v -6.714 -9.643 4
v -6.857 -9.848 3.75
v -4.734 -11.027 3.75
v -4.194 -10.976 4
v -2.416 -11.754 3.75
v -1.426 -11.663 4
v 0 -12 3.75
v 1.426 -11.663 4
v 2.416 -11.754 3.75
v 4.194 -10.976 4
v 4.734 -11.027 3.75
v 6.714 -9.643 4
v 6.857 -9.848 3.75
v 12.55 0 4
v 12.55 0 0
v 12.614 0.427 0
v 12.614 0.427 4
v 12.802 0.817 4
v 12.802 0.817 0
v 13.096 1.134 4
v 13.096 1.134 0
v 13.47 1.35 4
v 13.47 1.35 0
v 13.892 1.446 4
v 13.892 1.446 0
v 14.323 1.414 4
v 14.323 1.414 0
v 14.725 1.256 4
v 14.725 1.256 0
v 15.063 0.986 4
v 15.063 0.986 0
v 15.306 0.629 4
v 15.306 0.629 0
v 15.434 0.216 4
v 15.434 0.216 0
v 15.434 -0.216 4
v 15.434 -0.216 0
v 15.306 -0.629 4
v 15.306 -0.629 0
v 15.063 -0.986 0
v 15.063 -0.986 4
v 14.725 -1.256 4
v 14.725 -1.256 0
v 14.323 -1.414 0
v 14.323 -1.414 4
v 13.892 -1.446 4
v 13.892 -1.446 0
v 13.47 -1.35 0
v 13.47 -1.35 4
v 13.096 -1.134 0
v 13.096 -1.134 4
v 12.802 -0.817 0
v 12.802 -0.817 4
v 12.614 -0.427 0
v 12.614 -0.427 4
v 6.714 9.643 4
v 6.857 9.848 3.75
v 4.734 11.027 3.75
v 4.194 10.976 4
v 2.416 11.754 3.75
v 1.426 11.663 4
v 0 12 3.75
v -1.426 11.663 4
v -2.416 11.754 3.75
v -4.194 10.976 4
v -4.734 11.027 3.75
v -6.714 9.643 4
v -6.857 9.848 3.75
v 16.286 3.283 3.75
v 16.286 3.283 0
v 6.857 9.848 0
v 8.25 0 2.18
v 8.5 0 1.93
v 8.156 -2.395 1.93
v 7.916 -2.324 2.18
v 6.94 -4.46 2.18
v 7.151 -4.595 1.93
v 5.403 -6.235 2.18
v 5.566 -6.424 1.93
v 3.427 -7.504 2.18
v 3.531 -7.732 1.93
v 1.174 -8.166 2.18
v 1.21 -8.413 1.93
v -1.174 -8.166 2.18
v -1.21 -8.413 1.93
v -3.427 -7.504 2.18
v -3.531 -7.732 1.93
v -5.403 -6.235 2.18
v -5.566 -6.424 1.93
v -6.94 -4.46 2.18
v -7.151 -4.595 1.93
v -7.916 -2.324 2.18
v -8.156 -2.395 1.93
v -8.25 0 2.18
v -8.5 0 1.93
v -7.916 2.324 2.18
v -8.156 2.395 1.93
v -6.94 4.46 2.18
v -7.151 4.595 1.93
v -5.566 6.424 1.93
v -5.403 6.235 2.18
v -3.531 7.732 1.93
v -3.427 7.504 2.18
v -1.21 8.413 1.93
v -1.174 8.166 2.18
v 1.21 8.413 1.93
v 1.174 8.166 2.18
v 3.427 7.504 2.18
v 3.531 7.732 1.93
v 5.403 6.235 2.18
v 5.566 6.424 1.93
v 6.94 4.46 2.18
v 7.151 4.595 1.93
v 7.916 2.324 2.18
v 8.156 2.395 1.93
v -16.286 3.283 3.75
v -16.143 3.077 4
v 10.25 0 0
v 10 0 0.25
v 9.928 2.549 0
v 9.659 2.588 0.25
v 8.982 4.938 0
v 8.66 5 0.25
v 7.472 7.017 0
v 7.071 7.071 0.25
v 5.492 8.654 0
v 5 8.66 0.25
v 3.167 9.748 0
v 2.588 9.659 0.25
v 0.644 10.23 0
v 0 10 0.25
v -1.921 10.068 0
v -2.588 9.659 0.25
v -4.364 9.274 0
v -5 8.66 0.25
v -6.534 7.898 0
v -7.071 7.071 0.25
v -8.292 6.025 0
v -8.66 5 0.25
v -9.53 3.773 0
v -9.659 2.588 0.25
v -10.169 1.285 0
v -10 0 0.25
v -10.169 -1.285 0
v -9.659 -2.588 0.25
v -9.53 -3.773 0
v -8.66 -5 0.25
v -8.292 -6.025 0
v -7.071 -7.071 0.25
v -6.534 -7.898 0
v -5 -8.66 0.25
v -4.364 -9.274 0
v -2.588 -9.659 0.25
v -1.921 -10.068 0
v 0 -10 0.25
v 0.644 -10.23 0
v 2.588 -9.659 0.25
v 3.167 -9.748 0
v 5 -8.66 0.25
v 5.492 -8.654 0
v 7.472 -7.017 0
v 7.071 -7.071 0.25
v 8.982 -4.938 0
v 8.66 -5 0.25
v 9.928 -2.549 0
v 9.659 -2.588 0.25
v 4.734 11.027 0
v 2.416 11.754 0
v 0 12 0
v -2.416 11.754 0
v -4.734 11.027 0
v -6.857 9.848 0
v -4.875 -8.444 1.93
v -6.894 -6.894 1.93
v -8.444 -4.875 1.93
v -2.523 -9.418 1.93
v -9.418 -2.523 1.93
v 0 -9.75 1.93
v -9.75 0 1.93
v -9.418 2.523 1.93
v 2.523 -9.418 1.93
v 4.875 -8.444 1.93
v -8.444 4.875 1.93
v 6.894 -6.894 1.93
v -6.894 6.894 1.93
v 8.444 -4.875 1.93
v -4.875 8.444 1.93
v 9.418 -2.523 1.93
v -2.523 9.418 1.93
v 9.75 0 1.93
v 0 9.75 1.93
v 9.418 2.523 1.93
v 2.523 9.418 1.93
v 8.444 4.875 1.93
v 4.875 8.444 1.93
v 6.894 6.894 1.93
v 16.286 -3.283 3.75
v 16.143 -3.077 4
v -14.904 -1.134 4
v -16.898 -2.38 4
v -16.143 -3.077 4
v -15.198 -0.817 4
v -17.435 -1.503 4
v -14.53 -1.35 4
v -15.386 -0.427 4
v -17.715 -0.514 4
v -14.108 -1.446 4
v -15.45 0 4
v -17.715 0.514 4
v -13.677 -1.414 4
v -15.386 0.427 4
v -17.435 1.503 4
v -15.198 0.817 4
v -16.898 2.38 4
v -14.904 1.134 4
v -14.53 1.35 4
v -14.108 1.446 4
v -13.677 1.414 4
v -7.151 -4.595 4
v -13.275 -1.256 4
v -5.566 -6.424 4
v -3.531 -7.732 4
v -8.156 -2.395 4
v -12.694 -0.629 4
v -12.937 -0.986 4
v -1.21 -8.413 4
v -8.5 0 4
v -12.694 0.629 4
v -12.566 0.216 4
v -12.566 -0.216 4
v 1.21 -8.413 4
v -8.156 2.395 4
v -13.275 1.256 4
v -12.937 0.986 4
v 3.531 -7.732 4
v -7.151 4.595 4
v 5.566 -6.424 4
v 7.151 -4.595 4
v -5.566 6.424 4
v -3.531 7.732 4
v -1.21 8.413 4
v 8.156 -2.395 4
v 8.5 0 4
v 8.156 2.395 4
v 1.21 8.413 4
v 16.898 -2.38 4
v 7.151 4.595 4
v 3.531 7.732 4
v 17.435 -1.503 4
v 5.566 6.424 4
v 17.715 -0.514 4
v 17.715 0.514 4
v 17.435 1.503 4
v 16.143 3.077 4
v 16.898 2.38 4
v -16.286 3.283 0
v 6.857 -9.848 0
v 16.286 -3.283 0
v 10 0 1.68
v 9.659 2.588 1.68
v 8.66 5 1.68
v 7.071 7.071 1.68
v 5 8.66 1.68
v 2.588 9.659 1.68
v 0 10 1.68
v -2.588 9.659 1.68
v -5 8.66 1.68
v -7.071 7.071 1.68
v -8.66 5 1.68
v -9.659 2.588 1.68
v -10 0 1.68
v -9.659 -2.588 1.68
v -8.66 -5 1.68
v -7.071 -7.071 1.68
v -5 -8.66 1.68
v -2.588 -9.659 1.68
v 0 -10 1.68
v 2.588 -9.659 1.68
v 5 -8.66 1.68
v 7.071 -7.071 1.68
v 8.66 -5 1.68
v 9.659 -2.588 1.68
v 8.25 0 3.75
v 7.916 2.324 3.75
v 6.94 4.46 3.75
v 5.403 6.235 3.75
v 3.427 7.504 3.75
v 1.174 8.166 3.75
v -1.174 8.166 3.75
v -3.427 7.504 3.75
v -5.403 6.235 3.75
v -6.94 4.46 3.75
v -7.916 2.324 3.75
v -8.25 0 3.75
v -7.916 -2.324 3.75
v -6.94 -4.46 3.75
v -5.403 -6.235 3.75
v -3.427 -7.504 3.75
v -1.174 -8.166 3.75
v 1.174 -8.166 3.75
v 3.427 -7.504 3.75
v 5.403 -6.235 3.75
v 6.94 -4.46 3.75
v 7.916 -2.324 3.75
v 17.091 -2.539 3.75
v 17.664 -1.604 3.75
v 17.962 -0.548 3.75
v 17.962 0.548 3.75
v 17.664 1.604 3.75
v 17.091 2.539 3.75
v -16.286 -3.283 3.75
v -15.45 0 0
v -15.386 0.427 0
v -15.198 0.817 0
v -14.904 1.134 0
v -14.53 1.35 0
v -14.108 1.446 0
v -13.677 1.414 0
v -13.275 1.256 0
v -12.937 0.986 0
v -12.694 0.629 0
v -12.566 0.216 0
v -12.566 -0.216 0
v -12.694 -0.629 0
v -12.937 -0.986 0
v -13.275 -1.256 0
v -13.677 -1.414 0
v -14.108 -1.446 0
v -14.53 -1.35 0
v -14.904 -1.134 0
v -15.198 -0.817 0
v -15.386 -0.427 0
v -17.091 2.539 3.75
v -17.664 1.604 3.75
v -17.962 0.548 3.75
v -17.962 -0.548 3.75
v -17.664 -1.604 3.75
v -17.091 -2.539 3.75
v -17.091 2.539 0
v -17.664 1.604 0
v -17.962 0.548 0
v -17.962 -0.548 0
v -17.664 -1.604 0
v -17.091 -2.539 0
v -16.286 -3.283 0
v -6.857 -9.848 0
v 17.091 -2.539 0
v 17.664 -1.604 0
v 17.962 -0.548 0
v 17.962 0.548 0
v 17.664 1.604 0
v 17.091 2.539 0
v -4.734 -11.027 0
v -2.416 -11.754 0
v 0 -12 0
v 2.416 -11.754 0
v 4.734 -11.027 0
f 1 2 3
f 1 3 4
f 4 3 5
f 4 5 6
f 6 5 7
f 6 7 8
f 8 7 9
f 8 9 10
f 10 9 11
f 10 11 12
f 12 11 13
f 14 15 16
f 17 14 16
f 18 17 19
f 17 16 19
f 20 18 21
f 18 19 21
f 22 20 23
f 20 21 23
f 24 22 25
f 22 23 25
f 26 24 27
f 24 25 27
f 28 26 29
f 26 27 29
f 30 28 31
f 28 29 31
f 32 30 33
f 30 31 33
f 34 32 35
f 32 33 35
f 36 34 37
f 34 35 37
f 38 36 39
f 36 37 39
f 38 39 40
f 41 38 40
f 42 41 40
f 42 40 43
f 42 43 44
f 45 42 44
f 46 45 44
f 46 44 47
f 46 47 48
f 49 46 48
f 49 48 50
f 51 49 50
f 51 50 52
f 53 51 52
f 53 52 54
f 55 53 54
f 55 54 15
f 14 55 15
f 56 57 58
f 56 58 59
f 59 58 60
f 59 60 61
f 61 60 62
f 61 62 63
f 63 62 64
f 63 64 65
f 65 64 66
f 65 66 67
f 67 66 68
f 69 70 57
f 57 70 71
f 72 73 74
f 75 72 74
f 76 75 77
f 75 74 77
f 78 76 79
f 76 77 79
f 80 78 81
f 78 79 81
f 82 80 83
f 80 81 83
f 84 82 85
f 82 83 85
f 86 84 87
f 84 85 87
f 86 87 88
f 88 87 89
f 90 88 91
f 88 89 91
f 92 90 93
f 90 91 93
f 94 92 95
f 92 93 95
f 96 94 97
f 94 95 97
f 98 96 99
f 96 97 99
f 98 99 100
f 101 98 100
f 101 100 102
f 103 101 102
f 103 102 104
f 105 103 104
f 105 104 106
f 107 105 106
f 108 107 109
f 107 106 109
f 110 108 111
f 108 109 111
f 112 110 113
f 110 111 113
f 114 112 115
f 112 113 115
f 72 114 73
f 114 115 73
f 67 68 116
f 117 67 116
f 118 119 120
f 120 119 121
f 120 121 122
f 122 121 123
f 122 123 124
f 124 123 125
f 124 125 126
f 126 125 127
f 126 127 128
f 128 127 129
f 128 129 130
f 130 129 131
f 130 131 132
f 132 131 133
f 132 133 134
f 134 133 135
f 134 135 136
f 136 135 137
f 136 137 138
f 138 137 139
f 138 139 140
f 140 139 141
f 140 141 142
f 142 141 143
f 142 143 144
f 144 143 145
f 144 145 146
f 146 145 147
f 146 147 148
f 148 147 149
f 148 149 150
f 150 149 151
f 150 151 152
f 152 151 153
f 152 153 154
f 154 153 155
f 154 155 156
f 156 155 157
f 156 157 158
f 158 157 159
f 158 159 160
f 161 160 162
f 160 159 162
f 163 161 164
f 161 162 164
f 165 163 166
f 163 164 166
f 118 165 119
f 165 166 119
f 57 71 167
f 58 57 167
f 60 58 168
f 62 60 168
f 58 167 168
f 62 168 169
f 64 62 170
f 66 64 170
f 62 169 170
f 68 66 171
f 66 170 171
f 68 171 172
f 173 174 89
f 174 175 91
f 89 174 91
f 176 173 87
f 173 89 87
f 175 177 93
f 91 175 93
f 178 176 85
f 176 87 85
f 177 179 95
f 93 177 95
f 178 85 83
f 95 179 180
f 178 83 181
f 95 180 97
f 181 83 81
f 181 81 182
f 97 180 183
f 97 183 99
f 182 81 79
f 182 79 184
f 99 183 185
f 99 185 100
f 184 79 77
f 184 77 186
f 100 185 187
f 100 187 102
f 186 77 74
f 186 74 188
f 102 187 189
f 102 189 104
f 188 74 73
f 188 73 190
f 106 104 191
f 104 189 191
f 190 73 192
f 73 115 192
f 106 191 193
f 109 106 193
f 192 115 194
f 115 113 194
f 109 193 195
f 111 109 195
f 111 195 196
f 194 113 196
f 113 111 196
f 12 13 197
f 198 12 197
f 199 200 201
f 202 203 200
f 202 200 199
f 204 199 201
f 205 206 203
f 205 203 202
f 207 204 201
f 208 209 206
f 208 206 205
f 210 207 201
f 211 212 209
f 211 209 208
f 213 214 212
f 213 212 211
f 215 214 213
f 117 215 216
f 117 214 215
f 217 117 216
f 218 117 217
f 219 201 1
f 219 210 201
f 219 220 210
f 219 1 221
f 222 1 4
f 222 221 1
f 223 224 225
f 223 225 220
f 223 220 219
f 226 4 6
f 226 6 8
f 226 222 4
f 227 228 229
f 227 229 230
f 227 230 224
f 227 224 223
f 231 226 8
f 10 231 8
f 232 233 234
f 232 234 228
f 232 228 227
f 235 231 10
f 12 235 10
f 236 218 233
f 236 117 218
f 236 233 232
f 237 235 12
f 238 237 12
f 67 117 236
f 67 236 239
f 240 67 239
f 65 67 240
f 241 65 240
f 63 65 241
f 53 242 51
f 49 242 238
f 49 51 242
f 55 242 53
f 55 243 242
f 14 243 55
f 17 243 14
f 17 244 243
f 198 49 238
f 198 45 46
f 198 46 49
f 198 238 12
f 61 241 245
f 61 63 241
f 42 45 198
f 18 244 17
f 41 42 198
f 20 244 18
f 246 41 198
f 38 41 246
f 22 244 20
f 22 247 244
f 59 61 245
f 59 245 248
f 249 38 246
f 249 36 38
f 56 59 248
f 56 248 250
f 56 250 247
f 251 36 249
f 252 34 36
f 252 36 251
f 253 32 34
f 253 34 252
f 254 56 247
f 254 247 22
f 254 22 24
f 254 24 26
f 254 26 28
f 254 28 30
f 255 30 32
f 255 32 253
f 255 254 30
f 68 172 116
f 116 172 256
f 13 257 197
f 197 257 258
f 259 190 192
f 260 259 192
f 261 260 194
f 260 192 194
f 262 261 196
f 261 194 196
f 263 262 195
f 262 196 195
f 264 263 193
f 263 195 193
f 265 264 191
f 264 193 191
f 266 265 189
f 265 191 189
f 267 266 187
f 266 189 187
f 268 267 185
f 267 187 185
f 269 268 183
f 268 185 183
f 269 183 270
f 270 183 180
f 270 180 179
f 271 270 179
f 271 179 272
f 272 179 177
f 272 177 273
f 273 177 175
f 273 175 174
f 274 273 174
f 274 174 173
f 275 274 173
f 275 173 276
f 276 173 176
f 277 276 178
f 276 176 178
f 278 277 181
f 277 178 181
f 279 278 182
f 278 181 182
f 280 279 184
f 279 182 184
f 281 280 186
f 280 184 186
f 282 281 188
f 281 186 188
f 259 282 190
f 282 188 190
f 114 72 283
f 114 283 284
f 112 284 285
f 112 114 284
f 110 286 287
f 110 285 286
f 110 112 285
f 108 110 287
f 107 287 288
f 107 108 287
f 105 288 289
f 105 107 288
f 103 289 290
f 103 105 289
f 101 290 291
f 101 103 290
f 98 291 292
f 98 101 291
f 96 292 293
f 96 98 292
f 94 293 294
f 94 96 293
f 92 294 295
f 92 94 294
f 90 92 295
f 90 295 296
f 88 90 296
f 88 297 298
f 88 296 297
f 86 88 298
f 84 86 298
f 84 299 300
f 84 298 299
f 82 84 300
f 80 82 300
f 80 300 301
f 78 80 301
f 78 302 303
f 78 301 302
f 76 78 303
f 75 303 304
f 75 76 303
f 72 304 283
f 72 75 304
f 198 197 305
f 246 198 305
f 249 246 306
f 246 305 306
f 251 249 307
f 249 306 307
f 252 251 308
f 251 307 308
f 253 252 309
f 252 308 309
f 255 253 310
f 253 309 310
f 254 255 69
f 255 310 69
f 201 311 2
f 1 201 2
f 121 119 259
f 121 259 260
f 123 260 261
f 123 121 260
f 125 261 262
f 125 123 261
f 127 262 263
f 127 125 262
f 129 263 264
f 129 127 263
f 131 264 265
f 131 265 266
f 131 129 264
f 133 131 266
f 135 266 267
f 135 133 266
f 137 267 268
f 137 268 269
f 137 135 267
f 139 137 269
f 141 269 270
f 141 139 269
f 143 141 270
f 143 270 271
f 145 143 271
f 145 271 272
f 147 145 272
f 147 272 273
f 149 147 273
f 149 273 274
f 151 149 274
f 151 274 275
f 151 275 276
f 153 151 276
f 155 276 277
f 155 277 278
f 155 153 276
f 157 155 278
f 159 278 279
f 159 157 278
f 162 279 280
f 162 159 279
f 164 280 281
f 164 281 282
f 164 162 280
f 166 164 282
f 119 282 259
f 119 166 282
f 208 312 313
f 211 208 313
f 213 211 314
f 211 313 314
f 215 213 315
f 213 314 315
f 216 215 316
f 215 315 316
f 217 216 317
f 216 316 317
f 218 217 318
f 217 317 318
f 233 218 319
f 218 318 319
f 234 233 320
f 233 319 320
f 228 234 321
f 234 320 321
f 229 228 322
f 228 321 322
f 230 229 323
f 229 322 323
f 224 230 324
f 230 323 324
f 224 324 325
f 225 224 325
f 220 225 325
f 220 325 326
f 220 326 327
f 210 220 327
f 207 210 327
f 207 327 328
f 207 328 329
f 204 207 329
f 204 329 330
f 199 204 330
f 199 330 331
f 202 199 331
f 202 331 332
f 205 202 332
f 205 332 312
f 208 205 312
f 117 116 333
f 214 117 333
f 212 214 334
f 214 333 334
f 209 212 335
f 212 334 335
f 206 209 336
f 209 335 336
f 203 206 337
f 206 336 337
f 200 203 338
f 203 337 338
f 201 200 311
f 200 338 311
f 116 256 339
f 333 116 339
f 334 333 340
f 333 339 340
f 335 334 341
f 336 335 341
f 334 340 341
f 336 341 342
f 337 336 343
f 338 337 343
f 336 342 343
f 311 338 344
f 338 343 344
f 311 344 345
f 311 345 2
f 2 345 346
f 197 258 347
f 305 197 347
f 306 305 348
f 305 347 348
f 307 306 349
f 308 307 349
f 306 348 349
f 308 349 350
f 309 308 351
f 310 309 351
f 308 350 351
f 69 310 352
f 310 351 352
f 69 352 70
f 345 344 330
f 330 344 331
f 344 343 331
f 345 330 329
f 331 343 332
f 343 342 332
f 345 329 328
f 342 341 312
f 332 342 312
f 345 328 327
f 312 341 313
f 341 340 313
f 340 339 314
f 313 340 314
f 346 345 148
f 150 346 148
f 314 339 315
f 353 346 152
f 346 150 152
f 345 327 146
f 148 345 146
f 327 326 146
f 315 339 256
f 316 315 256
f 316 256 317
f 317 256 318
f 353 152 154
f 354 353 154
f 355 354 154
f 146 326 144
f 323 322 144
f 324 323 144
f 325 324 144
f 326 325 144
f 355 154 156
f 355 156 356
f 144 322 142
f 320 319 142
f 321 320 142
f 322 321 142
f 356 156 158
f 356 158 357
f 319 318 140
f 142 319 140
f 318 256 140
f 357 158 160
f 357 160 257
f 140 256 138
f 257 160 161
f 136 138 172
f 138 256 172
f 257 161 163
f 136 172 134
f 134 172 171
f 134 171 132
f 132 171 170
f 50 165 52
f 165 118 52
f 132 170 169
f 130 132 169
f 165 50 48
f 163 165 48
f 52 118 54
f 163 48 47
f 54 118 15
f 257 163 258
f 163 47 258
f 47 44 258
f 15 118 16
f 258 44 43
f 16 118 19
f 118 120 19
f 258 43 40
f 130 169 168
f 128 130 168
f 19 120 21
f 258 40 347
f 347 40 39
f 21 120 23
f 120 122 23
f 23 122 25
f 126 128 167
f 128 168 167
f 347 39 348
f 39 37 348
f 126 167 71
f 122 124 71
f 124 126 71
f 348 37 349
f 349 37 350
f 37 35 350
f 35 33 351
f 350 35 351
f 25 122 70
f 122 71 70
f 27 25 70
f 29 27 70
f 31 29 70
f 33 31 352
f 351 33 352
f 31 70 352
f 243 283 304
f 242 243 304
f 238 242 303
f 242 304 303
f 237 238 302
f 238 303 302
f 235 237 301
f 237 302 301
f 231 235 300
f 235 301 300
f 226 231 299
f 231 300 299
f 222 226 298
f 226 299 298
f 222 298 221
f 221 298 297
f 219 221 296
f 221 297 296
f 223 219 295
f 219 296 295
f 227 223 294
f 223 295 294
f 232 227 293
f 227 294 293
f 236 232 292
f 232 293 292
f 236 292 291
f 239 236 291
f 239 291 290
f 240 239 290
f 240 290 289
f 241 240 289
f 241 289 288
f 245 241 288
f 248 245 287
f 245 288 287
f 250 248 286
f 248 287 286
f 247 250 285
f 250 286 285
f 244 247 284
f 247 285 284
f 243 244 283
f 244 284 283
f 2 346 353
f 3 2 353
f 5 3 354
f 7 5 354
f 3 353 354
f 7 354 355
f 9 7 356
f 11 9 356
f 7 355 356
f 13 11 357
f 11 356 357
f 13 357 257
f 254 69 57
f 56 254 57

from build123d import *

# Parameters (mm, degrees)
BOSS_EXTRUDE1_DEPTH     = 4
CUT_EXTRUDE1_DEPTH      = 23
CUT_EXTRUDE1_DEPTH_BACK = 23
SKETCH1_4_R             = 8.25
CUT_EXTRUDE2_DEPTH      = 1.93
CUT_EXTRUDE2_DEPTH_BACK = 23
SKETCH1_6_R             = 10
M2_5_CLEARANCE_HOLE1_D  = 2.9
CHAMFER1_SIZE           = 0.25


with BuildPart() as part:
    # Sketch1 → Boss-Extrude1 (new body)
    with BuildSketch(Plane.XY):
        with BuildLine():
            ThreePointArc((6.857142857, 9.84782168), (0, 12), (-6.857142857, 9.84782168))
            Line((-6.857142857, 9.84782168), (-16.285714286, 3.282607227))
            ThreePointArc((-16.285714286, 3.282607227), (-18, 0), (-16.285714286, -3.282607227))
            Line((-16.285714286, -3.282607227), (-6.857142857, -9.84782168))
            ThreePointArc((-6.857142857, -9.84782168), (0, -12), (6.857142857, -9.84782168))
            Line((6.857142857, -9.84782168), (16.285714286, -3.282607227))
            ThreePointArc((16.285714286, -3.282607227), (18, 0), (16.285714286, 3.282607227))
            Line((16.285714286, 3.282607227), (6.857142857, 9.84782168))
        make_face()
    extrude(amount=BOSS_EXTRUDE1_DEPTH)

    # Sketch1<4> → Cut-Extrude1 (cut, two sides: drawn at the far end of the back side and taken through both)
    with BuildSketch(Plane.XY.offset(-CUT_EXTRUDE1_DEPTH_BACK)):
        Circle(SKETCH1_4_R)
    extrude(amount=CUT_EXTRUDE1_DEPTH + CUT_EXTRUDE1_DEPTH_BACK, mode=Mode.SUBTRACT)

    # Sketch1<6> → Cut-Extrude2 (cut, two sides: drawn at the far end of the back side and taken through both)
    with BuildSketch(Plane.XY.offset(-CUT_EXTRUDE2_DEPTH_BACK)):
        Circle(SKETCH1_6_R)
    extrude(amount=CUT_EXTRUDE2_DEPTH + CUT_EXTRUDE2_DEPTH_BACK, mode=Mode.SUBTRACT)

    # M2.5 Clearance Hole1 (through all)
    with Locations(Plane.XY.offset(4)):
        with Locations((-14, 0), (14, 0)):
            Hole(M2_5_CLEARANCE_HOLE1_D / 2)

    # Chamfer1
    chamfer1_edges = [part.edges().sort_by_distance(p)[0] for p in [
        (-8.25, 0, 4),
        (-8.25, 0, 1.93),
        (-10, 0, 0),
        (-10, 0, 1.93),
        (0, -12, 4),
        (11.571428571, -6.565214453, 4),
        (-11.571428571, -6.565214453, 4),
        (18, 0, 4),
        (-18, 0, 4),
        (11.571428571, 6.565214453, 4),
        (-11.571428571, 6.565214453, 4),
        (0, 12, 4),
    ]]
    chamfer(chamfer1_edges, length=CHAMFER1_SIZE)


solid = part.part
